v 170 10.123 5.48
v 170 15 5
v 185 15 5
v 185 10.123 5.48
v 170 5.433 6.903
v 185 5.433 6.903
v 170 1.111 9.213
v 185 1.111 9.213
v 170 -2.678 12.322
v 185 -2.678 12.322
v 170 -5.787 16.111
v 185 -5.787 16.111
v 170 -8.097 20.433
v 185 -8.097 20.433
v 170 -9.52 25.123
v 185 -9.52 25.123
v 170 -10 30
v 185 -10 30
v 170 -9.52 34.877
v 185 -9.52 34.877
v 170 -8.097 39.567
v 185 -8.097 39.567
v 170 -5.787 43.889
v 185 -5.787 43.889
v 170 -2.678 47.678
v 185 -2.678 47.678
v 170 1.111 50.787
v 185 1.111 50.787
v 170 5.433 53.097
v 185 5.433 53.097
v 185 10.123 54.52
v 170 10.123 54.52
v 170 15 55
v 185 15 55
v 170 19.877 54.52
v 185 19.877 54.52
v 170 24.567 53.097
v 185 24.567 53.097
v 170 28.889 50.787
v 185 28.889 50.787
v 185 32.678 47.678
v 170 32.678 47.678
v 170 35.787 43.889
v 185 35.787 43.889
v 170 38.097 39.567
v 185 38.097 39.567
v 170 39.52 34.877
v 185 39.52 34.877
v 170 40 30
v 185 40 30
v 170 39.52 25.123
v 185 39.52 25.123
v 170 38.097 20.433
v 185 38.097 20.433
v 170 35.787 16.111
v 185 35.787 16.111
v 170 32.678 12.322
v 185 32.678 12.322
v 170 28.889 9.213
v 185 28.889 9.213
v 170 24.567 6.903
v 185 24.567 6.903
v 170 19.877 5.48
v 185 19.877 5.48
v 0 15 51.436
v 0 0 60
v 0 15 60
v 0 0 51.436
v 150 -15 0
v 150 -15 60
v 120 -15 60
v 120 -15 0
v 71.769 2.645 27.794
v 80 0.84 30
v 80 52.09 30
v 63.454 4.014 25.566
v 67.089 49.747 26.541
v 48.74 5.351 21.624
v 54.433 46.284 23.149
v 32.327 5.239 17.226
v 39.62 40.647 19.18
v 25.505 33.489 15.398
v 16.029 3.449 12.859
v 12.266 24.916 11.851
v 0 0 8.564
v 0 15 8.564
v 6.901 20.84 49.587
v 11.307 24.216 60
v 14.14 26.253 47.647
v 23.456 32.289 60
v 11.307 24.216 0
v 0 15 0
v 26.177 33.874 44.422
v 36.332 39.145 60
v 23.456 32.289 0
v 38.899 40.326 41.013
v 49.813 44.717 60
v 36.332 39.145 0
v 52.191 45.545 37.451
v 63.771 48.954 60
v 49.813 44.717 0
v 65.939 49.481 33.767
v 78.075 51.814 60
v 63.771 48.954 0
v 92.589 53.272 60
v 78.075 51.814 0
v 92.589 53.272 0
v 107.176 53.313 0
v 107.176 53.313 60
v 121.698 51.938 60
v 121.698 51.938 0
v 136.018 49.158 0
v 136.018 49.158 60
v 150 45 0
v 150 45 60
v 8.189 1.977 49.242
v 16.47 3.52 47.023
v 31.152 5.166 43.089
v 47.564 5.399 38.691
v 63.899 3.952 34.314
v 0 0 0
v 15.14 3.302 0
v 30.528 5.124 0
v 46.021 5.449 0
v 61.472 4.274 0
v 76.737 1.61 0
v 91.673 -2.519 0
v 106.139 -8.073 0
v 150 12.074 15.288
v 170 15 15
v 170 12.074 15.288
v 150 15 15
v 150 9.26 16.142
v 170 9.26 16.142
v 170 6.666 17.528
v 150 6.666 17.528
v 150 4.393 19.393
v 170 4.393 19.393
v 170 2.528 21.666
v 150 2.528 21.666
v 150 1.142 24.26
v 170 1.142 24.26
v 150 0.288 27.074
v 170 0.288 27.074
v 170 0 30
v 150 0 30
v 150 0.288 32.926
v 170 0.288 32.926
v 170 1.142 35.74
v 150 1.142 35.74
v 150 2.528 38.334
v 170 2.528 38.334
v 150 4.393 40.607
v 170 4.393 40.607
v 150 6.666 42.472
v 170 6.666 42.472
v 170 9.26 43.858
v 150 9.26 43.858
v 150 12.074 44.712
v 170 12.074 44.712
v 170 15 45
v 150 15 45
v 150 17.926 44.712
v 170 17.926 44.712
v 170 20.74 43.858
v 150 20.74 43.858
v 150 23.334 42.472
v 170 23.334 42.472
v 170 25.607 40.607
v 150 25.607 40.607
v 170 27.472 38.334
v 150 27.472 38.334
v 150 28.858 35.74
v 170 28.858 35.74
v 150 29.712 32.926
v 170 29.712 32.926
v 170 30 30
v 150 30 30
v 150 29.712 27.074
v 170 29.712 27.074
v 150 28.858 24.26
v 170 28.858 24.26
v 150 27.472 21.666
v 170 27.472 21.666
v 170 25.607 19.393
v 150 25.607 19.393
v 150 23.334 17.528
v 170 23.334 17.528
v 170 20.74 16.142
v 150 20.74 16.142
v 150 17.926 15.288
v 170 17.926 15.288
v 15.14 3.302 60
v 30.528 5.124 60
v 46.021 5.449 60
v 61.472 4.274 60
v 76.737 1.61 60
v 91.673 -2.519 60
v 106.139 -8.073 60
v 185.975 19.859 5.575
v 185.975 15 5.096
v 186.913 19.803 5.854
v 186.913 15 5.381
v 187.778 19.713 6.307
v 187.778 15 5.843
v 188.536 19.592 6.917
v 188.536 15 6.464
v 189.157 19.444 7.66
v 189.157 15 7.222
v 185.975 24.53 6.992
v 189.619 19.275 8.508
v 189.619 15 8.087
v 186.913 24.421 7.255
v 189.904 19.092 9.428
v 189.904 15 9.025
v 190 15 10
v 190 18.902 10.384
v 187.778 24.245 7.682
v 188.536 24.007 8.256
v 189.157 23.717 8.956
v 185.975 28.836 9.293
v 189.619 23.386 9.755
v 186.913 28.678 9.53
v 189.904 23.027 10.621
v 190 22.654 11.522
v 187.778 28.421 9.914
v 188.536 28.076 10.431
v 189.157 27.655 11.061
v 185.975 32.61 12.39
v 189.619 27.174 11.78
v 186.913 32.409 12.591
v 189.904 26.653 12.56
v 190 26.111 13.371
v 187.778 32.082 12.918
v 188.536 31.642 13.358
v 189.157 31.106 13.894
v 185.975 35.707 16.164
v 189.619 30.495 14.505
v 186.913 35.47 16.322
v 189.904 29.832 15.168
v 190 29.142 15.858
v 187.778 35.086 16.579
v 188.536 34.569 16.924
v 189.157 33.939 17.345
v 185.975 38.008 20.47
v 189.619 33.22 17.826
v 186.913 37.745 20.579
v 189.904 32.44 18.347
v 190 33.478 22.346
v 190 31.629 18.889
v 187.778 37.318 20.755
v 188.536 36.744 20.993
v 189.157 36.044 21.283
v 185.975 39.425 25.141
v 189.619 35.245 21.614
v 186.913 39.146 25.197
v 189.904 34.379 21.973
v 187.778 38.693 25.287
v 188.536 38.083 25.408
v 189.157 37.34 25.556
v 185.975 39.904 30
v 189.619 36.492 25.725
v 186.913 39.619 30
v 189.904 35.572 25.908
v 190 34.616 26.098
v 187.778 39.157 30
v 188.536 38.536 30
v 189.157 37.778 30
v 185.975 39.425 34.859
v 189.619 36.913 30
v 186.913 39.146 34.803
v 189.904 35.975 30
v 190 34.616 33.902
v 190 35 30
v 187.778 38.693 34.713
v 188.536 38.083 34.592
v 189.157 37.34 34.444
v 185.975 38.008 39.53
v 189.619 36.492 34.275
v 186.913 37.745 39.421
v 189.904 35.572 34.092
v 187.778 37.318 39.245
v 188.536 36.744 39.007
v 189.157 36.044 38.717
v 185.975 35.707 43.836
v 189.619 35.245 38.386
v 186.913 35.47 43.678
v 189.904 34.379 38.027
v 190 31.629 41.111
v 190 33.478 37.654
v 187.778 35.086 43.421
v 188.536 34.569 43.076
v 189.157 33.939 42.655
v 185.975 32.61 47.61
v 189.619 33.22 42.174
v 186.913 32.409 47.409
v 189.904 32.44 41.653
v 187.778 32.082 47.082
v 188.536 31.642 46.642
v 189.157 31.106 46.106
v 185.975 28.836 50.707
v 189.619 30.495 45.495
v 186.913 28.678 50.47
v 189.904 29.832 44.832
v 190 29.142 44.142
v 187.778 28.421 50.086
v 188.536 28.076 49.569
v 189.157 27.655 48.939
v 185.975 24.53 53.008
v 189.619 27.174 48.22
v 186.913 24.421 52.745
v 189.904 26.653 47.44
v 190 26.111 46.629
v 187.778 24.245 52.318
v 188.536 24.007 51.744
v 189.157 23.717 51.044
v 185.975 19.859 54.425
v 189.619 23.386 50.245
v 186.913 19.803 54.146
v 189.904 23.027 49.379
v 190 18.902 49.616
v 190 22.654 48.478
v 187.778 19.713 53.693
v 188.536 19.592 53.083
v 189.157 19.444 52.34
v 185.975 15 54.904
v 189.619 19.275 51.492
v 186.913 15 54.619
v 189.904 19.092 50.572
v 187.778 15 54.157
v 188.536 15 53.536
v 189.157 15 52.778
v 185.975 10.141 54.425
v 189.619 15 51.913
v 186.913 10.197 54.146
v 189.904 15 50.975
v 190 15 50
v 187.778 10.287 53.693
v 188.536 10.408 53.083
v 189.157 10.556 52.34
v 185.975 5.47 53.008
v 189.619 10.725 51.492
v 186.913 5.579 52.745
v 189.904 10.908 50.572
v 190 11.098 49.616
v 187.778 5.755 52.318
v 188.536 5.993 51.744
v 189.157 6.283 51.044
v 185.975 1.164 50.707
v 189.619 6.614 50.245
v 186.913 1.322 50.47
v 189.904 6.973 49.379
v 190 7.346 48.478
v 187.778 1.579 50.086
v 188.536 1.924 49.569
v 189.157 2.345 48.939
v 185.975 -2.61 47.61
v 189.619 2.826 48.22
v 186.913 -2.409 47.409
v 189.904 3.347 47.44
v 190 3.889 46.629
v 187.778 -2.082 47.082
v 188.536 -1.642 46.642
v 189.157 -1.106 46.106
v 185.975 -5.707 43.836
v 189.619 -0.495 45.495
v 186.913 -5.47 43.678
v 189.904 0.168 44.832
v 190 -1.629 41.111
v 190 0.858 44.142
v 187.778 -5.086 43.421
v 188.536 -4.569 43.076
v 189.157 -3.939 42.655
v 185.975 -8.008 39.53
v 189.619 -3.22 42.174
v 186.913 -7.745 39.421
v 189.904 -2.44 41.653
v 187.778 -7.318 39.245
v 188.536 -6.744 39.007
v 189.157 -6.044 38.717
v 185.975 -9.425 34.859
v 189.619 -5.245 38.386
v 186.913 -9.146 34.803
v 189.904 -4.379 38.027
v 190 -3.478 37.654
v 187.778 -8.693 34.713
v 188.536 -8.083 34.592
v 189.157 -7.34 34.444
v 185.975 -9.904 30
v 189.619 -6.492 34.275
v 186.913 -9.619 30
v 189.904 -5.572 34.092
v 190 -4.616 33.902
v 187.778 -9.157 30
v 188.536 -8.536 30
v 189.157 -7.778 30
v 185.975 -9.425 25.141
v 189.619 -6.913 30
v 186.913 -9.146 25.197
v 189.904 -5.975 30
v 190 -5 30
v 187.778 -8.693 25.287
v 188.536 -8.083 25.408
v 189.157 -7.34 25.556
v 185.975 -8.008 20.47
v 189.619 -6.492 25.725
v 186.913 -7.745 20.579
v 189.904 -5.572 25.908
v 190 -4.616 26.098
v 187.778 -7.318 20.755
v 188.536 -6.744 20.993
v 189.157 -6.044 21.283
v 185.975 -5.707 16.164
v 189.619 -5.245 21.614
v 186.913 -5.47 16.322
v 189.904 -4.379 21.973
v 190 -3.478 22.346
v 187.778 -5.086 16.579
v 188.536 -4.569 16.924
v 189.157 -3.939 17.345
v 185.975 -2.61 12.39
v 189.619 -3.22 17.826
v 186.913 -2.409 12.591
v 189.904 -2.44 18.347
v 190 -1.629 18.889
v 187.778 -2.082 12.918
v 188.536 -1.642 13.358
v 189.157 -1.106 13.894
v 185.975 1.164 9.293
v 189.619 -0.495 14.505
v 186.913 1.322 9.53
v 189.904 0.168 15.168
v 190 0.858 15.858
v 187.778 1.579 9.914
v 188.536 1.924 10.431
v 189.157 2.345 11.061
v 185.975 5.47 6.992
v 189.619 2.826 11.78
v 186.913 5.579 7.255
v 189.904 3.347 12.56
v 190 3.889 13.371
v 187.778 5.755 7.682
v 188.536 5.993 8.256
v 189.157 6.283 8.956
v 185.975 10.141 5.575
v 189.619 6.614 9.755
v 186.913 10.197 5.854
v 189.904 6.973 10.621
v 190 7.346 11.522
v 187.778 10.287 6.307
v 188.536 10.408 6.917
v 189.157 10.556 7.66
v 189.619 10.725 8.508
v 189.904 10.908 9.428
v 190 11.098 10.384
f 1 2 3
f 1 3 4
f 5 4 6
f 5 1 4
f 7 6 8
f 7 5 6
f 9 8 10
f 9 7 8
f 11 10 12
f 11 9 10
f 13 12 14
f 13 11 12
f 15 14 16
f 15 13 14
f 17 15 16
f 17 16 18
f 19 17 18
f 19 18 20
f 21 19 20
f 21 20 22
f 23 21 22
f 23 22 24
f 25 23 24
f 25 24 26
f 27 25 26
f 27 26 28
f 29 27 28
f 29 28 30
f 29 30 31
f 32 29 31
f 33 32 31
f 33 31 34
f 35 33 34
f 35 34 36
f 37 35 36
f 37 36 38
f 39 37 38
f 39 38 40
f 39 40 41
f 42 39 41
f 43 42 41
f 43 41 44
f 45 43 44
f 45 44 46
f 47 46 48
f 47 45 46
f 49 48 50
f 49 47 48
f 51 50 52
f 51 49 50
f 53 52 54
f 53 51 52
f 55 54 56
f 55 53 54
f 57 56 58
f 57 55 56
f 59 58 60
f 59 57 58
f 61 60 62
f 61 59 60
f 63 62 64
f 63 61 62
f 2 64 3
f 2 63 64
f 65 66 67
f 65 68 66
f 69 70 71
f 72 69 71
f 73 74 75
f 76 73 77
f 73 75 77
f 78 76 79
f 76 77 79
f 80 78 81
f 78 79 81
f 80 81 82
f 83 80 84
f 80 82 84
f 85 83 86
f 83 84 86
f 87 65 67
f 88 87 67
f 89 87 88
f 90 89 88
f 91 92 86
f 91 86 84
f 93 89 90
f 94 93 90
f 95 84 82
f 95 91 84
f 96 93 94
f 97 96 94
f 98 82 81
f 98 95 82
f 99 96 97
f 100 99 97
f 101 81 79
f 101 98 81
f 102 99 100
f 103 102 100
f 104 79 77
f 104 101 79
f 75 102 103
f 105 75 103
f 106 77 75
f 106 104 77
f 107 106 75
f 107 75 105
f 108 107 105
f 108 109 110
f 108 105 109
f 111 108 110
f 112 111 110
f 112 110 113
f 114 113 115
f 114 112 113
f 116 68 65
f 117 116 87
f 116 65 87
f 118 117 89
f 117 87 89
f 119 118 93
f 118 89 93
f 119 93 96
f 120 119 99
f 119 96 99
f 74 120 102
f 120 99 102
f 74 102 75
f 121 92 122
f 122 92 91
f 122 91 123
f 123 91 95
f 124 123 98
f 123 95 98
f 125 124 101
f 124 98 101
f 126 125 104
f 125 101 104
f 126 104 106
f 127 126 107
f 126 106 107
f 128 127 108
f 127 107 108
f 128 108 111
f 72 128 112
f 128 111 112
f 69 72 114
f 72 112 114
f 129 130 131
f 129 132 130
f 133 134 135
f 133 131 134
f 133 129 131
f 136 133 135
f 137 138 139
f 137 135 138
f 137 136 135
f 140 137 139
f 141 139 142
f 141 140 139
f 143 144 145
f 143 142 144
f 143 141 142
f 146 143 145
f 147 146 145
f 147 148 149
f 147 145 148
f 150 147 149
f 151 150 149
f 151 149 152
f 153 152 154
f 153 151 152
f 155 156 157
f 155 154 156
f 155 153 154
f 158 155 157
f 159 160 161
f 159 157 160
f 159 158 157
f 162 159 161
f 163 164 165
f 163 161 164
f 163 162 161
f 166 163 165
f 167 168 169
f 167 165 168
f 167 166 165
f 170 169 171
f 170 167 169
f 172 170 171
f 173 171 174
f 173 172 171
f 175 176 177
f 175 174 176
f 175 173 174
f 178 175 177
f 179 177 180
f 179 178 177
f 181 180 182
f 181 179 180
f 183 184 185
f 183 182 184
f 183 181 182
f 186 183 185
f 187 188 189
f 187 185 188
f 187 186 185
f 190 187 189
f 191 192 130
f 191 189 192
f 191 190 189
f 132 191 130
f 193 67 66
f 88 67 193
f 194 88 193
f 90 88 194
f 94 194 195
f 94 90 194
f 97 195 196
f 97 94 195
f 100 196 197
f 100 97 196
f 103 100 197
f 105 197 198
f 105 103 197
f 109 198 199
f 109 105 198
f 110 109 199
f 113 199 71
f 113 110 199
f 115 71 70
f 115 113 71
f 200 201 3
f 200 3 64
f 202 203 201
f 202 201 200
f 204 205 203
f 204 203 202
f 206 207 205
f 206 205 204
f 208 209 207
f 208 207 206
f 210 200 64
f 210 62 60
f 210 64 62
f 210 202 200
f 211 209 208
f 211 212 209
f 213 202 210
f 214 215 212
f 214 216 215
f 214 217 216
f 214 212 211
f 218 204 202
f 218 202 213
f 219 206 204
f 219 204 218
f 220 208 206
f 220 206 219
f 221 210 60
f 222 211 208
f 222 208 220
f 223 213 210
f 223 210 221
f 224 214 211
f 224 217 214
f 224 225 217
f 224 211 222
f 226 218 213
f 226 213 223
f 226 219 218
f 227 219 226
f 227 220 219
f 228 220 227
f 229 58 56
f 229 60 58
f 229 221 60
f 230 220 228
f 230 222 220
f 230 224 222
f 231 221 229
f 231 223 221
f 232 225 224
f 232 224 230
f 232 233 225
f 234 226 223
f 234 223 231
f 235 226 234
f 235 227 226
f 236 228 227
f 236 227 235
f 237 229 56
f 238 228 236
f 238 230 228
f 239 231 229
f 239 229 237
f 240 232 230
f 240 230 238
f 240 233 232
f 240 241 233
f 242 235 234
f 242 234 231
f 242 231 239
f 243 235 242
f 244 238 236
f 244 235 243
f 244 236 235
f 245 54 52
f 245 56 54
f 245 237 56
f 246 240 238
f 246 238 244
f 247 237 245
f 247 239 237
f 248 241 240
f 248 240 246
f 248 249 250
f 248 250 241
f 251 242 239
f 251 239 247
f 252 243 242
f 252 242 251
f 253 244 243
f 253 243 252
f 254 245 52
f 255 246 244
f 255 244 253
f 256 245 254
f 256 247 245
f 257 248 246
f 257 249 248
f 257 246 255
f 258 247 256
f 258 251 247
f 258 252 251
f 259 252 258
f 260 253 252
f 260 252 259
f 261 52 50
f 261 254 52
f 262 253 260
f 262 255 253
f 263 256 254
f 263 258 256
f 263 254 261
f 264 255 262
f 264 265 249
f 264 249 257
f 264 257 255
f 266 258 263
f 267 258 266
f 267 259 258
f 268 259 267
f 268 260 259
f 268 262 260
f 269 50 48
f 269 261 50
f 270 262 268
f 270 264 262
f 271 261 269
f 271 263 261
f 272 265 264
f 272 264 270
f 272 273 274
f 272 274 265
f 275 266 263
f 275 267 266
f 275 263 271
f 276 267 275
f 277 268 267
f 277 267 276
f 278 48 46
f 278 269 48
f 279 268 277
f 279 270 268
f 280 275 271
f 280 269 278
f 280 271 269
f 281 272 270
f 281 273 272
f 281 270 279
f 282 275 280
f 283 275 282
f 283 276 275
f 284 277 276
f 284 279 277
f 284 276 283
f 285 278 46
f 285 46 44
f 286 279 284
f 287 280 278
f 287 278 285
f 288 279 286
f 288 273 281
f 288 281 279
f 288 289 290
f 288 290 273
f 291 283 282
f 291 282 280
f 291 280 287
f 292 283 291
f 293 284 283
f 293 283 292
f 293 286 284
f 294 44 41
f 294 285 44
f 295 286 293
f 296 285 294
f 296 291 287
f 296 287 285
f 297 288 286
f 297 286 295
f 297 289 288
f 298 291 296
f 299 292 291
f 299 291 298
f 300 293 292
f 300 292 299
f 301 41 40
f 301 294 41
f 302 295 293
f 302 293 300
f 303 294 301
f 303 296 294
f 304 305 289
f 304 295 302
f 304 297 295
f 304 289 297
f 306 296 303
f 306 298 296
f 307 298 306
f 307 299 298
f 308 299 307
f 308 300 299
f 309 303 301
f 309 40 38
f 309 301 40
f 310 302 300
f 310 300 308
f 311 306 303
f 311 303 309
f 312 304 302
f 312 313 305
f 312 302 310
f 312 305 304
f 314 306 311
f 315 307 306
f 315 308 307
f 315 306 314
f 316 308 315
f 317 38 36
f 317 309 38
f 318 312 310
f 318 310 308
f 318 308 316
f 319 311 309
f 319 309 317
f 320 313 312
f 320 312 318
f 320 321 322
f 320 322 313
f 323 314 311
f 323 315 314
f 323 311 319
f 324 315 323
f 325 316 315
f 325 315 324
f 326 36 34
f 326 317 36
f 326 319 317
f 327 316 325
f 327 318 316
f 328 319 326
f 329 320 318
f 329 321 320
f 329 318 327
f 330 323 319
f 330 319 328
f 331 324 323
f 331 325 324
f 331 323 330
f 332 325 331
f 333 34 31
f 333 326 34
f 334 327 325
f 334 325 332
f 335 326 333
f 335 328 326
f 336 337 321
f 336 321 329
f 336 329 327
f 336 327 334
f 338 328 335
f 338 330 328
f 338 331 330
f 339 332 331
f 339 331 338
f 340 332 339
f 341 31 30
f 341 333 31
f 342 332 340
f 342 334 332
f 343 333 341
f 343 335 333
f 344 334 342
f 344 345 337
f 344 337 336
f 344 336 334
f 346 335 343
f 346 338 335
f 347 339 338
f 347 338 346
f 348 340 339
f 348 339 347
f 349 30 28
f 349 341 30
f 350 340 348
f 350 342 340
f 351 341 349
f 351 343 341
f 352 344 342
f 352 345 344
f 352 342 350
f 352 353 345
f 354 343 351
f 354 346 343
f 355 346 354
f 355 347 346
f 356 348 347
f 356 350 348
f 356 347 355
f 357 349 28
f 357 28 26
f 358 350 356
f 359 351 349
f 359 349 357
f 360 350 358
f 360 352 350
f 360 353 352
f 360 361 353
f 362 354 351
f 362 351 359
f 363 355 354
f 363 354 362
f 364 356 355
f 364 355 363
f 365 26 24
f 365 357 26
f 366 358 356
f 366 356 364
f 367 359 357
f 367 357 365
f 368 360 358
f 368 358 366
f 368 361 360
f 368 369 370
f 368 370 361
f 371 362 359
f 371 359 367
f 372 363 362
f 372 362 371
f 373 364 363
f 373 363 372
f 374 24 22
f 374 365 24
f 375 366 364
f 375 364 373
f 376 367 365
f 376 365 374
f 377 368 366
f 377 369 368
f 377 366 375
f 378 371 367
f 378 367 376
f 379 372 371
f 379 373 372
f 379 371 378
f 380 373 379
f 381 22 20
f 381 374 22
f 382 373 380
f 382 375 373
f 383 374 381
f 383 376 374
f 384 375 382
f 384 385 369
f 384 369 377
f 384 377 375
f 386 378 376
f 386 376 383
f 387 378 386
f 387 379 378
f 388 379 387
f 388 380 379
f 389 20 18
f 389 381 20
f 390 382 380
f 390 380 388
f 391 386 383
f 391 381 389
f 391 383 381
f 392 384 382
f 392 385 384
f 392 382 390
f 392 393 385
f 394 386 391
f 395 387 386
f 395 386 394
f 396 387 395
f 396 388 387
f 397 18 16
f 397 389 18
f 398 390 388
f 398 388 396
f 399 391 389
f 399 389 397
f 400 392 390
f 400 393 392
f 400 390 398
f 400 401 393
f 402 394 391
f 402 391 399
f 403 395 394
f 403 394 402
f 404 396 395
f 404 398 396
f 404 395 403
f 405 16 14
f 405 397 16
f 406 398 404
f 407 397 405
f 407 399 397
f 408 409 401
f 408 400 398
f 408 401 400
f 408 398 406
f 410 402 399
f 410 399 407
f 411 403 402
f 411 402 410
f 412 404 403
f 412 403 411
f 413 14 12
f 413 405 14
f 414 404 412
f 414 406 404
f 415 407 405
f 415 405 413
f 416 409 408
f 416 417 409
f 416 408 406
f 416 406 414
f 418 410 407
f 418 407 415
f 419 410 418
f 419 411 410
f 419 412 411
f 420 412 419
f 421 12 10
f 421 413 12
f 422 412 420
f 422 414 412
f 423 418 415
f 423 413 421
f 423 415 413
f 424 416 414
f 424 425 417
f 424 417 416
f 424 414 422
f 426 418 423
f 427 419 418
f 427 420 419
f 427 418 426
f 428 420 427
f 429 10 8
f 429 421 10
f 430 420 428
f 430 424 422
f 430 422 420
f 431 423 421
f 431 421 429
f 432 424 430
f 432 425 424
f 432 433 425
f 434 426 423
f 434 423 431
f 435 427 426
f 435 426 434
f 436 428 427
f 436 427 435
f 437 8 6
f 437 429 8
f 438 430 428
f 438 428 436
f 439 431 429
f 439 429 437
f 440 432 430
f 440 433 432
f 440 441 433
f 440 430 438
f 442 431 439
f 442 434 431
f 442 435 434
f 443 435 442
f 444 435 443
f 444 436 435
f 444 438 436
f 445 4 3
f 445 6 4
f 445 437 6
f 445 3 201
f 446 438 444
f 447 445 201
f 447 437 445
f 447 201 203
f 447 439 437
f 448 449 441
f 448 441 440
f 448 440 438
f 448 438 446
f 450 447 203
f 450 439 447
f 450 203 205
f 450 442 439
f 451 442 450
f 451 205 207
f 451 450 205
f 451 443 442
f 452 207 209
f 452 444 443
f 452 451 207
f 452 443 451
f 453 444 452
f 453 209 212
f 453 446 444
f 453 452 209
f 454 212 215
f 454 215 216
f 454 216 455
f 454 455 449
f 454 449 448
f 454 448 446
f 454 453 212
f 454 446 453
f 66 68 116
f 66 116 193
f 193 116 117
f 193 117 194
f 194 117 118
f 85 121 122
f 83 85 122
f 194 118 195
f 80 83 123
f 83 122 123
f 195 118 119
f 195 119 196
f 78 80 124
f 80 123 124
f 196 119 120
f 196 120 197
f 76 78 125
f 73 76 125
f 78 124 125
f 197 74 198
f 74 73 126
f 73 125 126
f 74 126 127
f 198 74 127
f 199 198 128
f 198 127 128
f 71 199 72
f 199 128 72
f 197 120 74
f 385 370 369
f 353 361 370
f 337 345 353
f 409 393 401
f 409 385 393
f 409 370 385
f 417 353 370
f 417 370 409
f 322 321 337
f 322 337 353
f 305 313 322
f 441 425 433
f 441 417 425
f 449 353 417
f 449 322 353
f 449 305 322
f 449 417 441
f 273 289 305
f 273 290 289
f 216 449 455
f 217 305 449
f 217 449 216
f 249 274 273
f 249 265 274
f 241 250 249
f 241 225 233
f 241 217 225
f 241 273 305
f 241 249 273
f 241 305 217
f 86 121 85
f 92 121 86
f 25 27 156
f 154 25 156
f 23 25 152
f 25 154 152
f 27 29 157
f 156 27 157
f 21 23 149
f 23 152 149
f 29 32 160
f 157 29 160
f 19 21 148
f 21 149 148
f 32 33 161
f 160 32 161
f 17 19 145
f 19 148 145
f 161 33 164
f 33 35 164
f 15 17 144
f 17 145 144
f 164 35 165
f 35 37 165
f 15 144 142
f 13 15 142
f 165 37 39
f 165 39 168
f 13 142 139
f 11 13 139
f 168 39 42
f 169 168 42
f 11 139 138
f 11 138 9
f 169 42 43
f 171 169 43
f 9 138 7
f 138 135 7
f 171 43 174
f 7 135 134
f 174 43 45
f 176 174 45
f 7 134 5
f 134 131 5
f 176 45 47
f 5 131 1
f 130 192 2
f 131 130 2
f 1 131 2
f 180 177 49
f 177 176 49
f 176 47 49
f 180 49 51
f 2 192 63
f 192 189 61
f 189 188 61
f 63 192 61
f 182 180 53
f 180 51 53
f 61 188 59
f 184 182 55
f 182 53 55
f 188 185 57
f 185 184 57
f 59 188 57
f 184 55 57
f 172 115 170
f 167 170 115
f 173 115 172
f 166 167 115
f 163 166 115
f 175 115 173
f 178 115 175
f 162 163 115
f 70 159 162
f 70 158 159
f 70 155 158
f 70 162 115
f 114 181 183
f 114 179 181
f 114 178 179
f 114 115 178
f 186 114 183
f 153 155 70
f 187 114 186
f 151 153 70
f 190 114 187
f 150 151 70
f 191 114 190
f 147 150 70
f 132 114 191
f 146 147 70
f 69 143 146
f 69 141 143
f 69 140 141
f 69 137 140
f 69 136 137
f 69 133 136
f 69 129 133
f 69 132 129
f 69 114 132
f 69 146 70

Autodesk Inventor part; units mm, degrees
ref_plane "YZ Plane" through (0, 0, 0) normal (1, 0, 0) x (0, 1, 0)
ref_plane "XZ Plane" through (0, 0, 0) normal (0, 1, 0) x (-1, 0, 0)
sketch "Skizze1" plane through (0, 0, 0) normal (0, 0, 1) x (1, 0, 0)
  line L0 (0, 0) -> (0, 15)
  arc A0 (150, 45) -> (0, 15) centre (100.3058, -96.5291) ccw
  line L1 (150, 45) -> (150, -15)
  line L2 (150, -15) -> (120, -15)
  arc A1 (120, -15) -> (0, 0) centre (41.6262, -154.4903) ccw
  dimension "hoehe2" = 60
  dimension "Durchmesser" = 160
  dimension "Durchmesser2" = 150
  dimension "Breite1" = 30
  dimension "d12" = 120
  dimension "Höhe1" = 15
  dimension "d14" = 15
extrude "Extrusion1" add sketch "Skizze1" along normal blind 60
ref_plane "Arbeitsebene1" through (100.3058, 53.4709, 0) normal (0, -1, 0) x (1, 0, 0)
sketch "Skizze2" plane through (100.3058, 53.4709, 0) normal (0, -1, 0) x (1, 0, 0)
  line L0 (-100.3058, 0) -> (-100.3058, 60) projected
  line L1 (-100.3058, 51.4359) -> (-20.3058, 30)
  line L2 (-20.3058, 30) -> (-100.3058, 8.5641)
  line L3 (-100.3058, 30) -> (-9.7877, 30) construction
  dimension "d17" = 30
  dimension "d18" = 80
extrude "Extrusion2" cut sketch "Skizze2" along normal up to surface
sketch "Skizze3" plane through (150, -15, 0) normal (1, 0, 0) x (0, 0, -1)
  circle A0 centre (-30, 30) radius 15
  line L0 (0, 0) -> (0, 60) projected
  line L1 (0, 0) -> (-60, 0) projected
  point P0 (0, 15)
  point P1 (0, 30)
  point P2 (-30, 0)
  dimension "d21" = 30
extrude "Extrusion3" add sketch "Skizze3" along normal blind 20
sketch "Skizze4" plane through (170, 15, 30) normal (1, 0, 0) x (0, 0, -1)
  line L0 (0, 37.0901) -> (0, -14.1602) projected
  circle A0 centre (0, 0) radius 25
  line L1 (30, -30) -> (30, 30) projected
  point P0 (30, -15)
  point P1 (30, 0)
  dimension "d24" = 50
extrude "Extrusion4" add sketch "Skizze4" along normal blind 20
fillet "Rundung1" radius 5 1 edges at (190, 15, 55)
properties part number "practice3" material "Phenolharz"
